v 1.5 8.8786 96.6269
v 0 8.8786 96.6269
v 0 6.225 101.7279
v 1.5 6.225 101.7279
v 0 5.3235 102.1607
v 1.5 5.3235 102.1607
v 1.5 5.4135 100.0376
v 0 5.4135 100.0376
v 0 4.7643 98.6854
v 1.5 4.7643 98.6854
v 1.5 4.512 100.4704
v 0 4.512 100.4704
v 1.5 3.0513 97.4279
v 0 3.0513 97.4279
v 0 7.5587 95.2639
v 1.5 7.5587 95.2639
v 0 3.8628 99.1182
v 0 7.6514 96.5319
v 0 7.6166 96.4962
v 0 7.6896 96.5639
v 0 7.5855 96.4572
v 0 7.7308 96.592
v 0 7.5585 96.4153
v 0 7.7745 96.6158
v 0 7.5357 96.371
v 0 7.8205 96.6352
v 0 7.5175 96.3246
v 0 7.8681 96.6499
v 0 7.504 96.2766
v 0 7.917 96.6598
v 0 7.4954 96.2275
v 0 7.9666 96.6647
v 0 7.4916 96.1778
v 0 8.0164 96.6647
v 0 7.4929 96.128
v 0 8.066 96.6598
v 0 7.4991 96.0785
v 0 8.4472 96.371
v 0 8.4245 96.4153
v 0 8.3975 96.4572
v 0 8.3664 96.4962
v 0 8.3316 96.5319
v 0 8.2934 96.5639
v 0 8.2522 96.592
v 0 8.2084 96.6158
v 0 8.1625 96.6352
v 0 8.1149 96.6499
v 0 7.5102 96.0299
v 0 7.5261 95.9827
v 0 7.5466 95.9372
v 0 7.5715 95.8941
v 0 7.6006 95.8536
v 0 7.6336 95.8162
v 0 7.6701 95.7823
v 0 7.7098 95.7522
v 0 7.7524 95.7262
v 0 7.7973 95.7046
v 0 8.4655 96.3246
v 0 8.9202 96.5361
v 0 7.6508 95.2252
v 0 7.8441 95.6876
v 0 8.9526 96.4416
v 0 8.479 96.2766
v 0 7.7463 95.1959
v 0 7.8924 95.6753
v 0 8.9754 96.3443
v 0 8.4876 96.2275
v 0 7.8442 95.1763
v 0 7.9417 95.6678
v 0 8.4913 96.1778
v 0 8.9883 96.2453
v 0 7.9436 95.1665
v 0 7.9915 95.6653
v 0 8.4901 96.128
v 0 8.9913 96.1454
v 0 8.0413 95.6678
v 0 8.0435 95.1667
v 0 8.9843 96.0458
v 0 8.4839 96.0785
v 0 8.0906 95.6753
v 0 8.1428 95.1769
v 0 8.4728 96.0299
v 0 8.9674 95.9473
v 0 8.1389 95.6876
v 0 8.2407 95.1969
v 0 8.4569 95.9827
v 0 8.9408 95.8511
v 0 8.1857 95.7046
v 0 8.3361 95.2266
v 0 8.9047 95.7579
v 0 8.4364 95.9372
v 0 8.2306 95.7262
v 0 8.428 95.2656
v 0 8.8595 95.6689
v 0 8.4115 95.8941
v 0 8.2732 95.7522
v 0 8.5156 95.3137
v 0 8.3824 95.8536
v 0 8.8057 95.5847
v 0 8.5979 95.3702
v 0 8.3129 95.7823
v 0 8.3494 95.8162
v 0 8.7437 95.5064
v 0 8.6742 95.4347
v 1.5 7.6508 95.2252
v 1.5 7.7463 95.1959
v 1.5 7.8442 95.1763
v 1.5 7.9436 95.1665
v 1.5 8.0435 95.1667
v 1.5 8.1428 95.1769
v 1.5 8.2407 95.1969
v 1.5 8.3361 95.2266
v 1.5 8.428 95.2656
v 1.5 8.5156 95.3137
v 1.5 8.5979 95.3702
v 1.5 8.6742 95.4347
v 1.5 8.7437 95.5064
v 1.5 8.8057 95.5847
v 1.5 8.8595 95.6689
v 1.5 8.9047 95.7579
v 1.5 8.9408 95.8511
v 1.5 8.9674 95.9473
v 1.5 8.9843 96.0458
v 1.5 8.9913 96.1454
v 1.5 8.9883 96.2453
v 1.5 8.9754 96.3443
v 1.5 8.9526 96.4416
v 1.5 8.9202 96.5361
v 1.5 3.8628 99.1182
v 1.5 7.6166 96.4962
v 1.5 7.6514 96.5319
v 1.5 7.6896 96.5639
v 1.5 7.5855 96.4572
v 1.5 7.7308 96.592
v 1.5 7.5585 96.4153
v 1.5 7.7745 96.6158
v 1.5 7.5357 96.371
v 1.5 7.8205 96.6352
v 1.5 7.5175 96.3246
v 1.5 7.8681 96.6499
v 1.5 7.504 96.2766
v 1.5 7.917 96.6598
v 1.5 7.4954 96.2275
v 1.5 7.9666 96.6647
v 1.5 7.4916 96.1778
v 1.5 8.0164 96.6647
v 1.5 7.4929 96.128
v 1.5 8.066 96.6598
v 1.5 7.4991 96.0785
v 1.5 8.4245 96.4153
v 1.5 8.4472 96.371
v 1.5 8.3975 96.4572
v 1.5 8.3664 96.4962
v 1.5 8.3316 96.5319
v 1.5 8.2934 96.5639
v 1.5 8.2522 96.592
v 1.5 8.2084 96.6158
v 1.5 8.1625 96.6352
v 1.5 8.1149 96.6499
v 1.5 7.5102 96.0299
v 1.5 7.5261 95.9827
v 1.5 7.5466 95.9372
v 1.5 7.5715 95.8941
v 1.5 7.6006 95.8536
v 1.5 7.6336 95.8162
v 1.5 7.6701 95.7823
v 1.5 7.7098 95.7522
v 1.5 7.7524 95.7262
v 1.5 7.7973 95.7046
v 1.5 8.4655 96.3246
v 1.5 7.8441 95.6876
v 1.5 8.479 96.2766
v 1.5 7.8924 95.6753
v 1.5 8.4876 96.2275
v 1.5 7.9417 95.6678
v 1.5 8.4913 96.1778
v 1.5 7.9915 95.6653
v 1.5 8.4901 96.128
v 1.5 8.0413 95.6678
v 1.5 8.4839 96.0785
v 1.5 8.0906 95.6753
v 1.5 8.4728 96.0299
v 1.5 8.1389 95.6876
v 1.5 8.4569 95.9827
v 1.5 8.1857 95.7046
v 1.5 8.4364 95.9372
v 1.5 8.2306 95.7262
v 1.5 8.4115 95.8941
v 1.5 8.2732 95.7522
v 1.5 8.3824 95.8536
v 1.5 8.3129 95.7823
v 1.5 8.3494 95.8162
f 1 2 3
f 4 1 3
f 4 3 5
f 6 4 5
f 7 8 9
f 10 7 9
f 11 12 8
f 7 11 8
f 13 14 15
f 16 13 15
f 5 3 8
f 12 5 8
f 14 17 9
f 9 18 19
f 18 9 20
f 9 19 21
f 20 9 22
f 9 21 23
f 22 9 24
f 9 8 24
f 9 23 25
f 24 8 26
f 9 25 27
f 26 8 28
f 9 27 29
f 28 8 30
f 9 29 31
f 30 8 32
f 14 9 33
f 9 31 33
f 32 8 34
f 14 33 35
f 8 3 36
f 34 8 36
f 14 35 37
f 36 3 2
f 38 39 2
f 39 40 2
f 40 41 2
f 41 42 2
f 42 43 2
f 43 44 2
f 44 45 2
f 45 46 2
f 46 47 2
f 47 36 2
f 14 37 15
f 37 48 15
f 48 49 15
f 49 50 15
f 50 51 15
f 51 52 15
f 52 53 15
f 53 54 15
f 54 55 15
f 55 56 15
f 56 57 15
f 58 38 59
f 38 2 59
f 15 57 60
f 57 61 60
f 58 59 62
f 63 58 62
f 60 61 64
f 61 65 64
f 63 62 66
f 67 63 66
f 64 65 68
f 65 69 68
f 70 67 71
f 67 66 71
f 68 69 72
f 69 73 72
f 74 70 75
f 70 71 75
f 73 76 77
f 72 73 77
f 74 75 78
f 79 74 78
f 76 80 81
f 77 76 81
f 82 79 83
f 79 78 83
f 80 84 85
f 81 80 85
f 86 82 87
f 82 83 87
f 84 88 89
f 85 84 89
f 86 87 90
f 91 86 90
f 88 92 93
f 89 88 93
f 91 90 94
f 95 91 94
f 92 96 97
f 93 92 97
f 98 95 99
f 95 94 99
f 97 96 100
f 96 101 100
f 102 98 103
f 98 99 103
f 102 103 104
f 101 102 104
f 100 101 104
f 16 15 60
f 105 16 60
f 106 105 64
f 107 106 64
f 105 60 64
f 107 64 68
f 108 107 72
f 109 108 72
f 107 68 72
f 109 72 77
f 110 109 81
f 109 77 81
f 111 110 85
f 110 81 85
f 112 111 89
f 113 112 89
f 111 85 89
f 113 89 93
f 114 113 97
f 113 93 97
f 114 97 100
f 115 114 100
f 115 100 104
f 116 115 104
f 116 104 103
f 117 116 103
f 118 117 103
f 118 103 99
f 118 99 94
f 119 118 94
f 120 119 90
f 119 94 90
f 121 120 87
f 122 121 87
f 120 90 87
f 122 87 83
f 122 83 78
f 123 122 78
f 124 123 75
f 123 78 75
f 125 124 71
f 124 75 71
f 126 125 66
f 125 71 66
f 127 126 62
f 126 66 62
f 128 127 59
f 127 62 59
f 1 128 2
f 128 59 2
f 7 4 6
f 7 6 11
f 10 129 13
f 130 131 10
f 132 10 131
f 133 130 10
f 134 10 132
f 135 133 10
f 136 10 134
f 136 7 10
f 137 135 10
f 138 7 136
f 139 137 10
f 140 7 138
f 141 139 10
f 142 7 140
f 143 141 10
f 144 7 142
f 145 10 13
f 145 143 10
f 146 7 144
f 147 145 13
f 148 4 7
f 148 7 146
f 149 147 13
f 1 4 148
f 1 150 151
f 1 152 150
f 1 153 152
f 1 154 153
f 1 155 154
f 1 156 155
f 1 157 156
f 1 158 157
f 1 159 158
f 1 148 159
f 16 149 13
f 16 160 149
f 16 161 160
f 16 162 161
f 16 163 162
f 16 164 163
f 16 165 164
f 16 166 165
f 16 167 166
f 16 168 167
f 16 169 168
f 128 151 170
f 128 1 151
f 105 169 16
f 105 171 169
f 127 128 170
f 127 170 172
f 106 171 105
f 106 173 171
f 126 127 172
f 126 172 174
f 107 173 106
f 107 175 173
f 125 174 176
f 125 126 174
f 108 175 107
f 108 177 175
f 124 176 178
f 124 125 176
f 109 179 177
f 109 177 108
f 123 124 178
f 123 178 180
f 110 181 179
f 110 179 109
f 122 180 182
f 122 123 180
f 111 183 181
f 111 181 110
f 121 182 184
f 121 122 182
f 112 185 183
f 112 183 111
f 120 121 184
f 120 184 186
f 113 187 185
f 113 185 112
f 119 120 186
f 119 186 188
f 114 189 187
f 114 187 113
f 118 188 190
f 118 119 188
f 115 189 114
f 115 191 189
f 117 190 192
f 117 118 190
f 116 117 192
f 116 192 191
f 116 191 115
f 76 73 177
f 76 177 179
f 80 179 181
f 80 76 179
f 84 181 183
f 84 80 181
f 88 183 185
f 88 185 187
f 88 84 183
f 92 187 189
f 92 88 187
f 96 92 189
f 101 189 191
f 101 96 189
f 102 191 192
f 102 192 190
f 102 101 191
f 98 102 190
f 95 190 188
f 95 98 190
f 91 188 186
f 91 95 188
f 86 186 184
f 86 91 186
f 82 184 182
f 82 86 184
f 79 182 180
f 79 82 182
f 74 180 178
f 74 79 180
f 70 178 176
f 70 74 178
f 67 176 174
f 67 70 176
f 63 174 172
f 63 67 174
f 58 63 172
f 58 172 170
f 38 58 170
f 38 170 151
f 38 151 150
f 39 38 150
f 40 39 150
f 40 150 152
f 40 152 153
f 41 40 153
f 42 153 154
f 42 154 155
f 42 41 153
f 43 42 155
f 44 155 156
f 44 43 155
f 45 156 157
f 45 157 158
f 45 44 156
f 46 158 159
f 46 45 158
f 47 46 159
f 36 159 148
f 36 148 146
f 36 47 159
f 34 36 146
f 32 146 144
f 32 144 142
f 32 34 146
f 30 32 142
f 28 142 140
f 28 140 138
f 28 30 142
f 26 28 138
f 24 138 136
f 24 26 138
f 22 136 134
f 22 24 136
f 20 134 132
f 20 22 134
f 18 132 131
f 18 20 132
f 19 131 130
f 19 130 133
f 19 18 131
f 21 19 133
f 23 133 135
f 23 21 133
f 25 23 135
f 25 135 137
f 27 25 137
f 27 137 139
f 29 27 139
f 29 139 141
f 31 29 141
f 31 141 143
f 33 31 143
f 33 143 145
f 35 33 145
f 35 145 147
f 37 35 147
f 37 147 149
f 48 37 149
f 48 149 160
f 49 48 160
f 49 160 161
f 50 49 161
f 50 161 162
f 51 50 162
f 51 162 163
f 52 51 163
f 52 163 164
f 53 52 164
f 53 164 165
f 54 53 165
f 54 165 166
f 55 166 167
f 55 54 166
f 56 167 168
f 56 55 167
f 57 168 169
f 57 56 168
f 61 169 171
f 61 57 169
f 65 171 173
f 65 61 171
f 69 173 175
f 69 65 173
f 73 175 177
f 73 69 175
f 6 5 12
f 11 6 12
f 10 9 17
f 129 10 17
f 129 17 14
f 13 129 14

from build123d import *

# Parameters (mm, degrees)
SKETCH1_R           = 0.5
BOSS_EXTRUDE1_DEPTH = 1.5


with BuildPart() as part:
    # Sketch1 → Boss-Extrude1 (new body)
    with BuildSketch(Plane(origin=(0, 0, 0), x_dir=(0, 0, -1), z_dir=(1, 0, 0))):
        with BuildLine():
            Line((-97.427906133, 3.051254101), (-95.263862375, 7.558682926))
            ThreePointArc((-95.263862375, 7.558682926), (-95.469674877, 8.709850021), (-96.626851501, 8.878630138))
            Line((-96.626851501, 8.878630138), (-101.727897648, 6.224985812))
            Line((-101.727897648, 6.224985812), (-102.1607064, 5.323500047))
            Line((-102.1607064, 5.323500047), (-100.47042059, 4.511983637))
            Line((-100.47042059, 4.511983637), (-100.037611839, 5.413469402))
            Line((-100.037611839, 5.413469402), (-98.685383191, 4.764256275))
            Line((-98.685383191, 4.764256275), (-99.118191943, 3.86277051))
            Line((-99.118191943, 3.86277051), (-97.427906133, 3.051254101))
        make_face()
        with Locations((-96.16534814, 7.991491677)):
            Circle(SKETCH1_R, mode=Mode.SUBTRACT)
    extrude(amount=BOSS_EXTRUDE1_DEPTH)


solid = part.part
